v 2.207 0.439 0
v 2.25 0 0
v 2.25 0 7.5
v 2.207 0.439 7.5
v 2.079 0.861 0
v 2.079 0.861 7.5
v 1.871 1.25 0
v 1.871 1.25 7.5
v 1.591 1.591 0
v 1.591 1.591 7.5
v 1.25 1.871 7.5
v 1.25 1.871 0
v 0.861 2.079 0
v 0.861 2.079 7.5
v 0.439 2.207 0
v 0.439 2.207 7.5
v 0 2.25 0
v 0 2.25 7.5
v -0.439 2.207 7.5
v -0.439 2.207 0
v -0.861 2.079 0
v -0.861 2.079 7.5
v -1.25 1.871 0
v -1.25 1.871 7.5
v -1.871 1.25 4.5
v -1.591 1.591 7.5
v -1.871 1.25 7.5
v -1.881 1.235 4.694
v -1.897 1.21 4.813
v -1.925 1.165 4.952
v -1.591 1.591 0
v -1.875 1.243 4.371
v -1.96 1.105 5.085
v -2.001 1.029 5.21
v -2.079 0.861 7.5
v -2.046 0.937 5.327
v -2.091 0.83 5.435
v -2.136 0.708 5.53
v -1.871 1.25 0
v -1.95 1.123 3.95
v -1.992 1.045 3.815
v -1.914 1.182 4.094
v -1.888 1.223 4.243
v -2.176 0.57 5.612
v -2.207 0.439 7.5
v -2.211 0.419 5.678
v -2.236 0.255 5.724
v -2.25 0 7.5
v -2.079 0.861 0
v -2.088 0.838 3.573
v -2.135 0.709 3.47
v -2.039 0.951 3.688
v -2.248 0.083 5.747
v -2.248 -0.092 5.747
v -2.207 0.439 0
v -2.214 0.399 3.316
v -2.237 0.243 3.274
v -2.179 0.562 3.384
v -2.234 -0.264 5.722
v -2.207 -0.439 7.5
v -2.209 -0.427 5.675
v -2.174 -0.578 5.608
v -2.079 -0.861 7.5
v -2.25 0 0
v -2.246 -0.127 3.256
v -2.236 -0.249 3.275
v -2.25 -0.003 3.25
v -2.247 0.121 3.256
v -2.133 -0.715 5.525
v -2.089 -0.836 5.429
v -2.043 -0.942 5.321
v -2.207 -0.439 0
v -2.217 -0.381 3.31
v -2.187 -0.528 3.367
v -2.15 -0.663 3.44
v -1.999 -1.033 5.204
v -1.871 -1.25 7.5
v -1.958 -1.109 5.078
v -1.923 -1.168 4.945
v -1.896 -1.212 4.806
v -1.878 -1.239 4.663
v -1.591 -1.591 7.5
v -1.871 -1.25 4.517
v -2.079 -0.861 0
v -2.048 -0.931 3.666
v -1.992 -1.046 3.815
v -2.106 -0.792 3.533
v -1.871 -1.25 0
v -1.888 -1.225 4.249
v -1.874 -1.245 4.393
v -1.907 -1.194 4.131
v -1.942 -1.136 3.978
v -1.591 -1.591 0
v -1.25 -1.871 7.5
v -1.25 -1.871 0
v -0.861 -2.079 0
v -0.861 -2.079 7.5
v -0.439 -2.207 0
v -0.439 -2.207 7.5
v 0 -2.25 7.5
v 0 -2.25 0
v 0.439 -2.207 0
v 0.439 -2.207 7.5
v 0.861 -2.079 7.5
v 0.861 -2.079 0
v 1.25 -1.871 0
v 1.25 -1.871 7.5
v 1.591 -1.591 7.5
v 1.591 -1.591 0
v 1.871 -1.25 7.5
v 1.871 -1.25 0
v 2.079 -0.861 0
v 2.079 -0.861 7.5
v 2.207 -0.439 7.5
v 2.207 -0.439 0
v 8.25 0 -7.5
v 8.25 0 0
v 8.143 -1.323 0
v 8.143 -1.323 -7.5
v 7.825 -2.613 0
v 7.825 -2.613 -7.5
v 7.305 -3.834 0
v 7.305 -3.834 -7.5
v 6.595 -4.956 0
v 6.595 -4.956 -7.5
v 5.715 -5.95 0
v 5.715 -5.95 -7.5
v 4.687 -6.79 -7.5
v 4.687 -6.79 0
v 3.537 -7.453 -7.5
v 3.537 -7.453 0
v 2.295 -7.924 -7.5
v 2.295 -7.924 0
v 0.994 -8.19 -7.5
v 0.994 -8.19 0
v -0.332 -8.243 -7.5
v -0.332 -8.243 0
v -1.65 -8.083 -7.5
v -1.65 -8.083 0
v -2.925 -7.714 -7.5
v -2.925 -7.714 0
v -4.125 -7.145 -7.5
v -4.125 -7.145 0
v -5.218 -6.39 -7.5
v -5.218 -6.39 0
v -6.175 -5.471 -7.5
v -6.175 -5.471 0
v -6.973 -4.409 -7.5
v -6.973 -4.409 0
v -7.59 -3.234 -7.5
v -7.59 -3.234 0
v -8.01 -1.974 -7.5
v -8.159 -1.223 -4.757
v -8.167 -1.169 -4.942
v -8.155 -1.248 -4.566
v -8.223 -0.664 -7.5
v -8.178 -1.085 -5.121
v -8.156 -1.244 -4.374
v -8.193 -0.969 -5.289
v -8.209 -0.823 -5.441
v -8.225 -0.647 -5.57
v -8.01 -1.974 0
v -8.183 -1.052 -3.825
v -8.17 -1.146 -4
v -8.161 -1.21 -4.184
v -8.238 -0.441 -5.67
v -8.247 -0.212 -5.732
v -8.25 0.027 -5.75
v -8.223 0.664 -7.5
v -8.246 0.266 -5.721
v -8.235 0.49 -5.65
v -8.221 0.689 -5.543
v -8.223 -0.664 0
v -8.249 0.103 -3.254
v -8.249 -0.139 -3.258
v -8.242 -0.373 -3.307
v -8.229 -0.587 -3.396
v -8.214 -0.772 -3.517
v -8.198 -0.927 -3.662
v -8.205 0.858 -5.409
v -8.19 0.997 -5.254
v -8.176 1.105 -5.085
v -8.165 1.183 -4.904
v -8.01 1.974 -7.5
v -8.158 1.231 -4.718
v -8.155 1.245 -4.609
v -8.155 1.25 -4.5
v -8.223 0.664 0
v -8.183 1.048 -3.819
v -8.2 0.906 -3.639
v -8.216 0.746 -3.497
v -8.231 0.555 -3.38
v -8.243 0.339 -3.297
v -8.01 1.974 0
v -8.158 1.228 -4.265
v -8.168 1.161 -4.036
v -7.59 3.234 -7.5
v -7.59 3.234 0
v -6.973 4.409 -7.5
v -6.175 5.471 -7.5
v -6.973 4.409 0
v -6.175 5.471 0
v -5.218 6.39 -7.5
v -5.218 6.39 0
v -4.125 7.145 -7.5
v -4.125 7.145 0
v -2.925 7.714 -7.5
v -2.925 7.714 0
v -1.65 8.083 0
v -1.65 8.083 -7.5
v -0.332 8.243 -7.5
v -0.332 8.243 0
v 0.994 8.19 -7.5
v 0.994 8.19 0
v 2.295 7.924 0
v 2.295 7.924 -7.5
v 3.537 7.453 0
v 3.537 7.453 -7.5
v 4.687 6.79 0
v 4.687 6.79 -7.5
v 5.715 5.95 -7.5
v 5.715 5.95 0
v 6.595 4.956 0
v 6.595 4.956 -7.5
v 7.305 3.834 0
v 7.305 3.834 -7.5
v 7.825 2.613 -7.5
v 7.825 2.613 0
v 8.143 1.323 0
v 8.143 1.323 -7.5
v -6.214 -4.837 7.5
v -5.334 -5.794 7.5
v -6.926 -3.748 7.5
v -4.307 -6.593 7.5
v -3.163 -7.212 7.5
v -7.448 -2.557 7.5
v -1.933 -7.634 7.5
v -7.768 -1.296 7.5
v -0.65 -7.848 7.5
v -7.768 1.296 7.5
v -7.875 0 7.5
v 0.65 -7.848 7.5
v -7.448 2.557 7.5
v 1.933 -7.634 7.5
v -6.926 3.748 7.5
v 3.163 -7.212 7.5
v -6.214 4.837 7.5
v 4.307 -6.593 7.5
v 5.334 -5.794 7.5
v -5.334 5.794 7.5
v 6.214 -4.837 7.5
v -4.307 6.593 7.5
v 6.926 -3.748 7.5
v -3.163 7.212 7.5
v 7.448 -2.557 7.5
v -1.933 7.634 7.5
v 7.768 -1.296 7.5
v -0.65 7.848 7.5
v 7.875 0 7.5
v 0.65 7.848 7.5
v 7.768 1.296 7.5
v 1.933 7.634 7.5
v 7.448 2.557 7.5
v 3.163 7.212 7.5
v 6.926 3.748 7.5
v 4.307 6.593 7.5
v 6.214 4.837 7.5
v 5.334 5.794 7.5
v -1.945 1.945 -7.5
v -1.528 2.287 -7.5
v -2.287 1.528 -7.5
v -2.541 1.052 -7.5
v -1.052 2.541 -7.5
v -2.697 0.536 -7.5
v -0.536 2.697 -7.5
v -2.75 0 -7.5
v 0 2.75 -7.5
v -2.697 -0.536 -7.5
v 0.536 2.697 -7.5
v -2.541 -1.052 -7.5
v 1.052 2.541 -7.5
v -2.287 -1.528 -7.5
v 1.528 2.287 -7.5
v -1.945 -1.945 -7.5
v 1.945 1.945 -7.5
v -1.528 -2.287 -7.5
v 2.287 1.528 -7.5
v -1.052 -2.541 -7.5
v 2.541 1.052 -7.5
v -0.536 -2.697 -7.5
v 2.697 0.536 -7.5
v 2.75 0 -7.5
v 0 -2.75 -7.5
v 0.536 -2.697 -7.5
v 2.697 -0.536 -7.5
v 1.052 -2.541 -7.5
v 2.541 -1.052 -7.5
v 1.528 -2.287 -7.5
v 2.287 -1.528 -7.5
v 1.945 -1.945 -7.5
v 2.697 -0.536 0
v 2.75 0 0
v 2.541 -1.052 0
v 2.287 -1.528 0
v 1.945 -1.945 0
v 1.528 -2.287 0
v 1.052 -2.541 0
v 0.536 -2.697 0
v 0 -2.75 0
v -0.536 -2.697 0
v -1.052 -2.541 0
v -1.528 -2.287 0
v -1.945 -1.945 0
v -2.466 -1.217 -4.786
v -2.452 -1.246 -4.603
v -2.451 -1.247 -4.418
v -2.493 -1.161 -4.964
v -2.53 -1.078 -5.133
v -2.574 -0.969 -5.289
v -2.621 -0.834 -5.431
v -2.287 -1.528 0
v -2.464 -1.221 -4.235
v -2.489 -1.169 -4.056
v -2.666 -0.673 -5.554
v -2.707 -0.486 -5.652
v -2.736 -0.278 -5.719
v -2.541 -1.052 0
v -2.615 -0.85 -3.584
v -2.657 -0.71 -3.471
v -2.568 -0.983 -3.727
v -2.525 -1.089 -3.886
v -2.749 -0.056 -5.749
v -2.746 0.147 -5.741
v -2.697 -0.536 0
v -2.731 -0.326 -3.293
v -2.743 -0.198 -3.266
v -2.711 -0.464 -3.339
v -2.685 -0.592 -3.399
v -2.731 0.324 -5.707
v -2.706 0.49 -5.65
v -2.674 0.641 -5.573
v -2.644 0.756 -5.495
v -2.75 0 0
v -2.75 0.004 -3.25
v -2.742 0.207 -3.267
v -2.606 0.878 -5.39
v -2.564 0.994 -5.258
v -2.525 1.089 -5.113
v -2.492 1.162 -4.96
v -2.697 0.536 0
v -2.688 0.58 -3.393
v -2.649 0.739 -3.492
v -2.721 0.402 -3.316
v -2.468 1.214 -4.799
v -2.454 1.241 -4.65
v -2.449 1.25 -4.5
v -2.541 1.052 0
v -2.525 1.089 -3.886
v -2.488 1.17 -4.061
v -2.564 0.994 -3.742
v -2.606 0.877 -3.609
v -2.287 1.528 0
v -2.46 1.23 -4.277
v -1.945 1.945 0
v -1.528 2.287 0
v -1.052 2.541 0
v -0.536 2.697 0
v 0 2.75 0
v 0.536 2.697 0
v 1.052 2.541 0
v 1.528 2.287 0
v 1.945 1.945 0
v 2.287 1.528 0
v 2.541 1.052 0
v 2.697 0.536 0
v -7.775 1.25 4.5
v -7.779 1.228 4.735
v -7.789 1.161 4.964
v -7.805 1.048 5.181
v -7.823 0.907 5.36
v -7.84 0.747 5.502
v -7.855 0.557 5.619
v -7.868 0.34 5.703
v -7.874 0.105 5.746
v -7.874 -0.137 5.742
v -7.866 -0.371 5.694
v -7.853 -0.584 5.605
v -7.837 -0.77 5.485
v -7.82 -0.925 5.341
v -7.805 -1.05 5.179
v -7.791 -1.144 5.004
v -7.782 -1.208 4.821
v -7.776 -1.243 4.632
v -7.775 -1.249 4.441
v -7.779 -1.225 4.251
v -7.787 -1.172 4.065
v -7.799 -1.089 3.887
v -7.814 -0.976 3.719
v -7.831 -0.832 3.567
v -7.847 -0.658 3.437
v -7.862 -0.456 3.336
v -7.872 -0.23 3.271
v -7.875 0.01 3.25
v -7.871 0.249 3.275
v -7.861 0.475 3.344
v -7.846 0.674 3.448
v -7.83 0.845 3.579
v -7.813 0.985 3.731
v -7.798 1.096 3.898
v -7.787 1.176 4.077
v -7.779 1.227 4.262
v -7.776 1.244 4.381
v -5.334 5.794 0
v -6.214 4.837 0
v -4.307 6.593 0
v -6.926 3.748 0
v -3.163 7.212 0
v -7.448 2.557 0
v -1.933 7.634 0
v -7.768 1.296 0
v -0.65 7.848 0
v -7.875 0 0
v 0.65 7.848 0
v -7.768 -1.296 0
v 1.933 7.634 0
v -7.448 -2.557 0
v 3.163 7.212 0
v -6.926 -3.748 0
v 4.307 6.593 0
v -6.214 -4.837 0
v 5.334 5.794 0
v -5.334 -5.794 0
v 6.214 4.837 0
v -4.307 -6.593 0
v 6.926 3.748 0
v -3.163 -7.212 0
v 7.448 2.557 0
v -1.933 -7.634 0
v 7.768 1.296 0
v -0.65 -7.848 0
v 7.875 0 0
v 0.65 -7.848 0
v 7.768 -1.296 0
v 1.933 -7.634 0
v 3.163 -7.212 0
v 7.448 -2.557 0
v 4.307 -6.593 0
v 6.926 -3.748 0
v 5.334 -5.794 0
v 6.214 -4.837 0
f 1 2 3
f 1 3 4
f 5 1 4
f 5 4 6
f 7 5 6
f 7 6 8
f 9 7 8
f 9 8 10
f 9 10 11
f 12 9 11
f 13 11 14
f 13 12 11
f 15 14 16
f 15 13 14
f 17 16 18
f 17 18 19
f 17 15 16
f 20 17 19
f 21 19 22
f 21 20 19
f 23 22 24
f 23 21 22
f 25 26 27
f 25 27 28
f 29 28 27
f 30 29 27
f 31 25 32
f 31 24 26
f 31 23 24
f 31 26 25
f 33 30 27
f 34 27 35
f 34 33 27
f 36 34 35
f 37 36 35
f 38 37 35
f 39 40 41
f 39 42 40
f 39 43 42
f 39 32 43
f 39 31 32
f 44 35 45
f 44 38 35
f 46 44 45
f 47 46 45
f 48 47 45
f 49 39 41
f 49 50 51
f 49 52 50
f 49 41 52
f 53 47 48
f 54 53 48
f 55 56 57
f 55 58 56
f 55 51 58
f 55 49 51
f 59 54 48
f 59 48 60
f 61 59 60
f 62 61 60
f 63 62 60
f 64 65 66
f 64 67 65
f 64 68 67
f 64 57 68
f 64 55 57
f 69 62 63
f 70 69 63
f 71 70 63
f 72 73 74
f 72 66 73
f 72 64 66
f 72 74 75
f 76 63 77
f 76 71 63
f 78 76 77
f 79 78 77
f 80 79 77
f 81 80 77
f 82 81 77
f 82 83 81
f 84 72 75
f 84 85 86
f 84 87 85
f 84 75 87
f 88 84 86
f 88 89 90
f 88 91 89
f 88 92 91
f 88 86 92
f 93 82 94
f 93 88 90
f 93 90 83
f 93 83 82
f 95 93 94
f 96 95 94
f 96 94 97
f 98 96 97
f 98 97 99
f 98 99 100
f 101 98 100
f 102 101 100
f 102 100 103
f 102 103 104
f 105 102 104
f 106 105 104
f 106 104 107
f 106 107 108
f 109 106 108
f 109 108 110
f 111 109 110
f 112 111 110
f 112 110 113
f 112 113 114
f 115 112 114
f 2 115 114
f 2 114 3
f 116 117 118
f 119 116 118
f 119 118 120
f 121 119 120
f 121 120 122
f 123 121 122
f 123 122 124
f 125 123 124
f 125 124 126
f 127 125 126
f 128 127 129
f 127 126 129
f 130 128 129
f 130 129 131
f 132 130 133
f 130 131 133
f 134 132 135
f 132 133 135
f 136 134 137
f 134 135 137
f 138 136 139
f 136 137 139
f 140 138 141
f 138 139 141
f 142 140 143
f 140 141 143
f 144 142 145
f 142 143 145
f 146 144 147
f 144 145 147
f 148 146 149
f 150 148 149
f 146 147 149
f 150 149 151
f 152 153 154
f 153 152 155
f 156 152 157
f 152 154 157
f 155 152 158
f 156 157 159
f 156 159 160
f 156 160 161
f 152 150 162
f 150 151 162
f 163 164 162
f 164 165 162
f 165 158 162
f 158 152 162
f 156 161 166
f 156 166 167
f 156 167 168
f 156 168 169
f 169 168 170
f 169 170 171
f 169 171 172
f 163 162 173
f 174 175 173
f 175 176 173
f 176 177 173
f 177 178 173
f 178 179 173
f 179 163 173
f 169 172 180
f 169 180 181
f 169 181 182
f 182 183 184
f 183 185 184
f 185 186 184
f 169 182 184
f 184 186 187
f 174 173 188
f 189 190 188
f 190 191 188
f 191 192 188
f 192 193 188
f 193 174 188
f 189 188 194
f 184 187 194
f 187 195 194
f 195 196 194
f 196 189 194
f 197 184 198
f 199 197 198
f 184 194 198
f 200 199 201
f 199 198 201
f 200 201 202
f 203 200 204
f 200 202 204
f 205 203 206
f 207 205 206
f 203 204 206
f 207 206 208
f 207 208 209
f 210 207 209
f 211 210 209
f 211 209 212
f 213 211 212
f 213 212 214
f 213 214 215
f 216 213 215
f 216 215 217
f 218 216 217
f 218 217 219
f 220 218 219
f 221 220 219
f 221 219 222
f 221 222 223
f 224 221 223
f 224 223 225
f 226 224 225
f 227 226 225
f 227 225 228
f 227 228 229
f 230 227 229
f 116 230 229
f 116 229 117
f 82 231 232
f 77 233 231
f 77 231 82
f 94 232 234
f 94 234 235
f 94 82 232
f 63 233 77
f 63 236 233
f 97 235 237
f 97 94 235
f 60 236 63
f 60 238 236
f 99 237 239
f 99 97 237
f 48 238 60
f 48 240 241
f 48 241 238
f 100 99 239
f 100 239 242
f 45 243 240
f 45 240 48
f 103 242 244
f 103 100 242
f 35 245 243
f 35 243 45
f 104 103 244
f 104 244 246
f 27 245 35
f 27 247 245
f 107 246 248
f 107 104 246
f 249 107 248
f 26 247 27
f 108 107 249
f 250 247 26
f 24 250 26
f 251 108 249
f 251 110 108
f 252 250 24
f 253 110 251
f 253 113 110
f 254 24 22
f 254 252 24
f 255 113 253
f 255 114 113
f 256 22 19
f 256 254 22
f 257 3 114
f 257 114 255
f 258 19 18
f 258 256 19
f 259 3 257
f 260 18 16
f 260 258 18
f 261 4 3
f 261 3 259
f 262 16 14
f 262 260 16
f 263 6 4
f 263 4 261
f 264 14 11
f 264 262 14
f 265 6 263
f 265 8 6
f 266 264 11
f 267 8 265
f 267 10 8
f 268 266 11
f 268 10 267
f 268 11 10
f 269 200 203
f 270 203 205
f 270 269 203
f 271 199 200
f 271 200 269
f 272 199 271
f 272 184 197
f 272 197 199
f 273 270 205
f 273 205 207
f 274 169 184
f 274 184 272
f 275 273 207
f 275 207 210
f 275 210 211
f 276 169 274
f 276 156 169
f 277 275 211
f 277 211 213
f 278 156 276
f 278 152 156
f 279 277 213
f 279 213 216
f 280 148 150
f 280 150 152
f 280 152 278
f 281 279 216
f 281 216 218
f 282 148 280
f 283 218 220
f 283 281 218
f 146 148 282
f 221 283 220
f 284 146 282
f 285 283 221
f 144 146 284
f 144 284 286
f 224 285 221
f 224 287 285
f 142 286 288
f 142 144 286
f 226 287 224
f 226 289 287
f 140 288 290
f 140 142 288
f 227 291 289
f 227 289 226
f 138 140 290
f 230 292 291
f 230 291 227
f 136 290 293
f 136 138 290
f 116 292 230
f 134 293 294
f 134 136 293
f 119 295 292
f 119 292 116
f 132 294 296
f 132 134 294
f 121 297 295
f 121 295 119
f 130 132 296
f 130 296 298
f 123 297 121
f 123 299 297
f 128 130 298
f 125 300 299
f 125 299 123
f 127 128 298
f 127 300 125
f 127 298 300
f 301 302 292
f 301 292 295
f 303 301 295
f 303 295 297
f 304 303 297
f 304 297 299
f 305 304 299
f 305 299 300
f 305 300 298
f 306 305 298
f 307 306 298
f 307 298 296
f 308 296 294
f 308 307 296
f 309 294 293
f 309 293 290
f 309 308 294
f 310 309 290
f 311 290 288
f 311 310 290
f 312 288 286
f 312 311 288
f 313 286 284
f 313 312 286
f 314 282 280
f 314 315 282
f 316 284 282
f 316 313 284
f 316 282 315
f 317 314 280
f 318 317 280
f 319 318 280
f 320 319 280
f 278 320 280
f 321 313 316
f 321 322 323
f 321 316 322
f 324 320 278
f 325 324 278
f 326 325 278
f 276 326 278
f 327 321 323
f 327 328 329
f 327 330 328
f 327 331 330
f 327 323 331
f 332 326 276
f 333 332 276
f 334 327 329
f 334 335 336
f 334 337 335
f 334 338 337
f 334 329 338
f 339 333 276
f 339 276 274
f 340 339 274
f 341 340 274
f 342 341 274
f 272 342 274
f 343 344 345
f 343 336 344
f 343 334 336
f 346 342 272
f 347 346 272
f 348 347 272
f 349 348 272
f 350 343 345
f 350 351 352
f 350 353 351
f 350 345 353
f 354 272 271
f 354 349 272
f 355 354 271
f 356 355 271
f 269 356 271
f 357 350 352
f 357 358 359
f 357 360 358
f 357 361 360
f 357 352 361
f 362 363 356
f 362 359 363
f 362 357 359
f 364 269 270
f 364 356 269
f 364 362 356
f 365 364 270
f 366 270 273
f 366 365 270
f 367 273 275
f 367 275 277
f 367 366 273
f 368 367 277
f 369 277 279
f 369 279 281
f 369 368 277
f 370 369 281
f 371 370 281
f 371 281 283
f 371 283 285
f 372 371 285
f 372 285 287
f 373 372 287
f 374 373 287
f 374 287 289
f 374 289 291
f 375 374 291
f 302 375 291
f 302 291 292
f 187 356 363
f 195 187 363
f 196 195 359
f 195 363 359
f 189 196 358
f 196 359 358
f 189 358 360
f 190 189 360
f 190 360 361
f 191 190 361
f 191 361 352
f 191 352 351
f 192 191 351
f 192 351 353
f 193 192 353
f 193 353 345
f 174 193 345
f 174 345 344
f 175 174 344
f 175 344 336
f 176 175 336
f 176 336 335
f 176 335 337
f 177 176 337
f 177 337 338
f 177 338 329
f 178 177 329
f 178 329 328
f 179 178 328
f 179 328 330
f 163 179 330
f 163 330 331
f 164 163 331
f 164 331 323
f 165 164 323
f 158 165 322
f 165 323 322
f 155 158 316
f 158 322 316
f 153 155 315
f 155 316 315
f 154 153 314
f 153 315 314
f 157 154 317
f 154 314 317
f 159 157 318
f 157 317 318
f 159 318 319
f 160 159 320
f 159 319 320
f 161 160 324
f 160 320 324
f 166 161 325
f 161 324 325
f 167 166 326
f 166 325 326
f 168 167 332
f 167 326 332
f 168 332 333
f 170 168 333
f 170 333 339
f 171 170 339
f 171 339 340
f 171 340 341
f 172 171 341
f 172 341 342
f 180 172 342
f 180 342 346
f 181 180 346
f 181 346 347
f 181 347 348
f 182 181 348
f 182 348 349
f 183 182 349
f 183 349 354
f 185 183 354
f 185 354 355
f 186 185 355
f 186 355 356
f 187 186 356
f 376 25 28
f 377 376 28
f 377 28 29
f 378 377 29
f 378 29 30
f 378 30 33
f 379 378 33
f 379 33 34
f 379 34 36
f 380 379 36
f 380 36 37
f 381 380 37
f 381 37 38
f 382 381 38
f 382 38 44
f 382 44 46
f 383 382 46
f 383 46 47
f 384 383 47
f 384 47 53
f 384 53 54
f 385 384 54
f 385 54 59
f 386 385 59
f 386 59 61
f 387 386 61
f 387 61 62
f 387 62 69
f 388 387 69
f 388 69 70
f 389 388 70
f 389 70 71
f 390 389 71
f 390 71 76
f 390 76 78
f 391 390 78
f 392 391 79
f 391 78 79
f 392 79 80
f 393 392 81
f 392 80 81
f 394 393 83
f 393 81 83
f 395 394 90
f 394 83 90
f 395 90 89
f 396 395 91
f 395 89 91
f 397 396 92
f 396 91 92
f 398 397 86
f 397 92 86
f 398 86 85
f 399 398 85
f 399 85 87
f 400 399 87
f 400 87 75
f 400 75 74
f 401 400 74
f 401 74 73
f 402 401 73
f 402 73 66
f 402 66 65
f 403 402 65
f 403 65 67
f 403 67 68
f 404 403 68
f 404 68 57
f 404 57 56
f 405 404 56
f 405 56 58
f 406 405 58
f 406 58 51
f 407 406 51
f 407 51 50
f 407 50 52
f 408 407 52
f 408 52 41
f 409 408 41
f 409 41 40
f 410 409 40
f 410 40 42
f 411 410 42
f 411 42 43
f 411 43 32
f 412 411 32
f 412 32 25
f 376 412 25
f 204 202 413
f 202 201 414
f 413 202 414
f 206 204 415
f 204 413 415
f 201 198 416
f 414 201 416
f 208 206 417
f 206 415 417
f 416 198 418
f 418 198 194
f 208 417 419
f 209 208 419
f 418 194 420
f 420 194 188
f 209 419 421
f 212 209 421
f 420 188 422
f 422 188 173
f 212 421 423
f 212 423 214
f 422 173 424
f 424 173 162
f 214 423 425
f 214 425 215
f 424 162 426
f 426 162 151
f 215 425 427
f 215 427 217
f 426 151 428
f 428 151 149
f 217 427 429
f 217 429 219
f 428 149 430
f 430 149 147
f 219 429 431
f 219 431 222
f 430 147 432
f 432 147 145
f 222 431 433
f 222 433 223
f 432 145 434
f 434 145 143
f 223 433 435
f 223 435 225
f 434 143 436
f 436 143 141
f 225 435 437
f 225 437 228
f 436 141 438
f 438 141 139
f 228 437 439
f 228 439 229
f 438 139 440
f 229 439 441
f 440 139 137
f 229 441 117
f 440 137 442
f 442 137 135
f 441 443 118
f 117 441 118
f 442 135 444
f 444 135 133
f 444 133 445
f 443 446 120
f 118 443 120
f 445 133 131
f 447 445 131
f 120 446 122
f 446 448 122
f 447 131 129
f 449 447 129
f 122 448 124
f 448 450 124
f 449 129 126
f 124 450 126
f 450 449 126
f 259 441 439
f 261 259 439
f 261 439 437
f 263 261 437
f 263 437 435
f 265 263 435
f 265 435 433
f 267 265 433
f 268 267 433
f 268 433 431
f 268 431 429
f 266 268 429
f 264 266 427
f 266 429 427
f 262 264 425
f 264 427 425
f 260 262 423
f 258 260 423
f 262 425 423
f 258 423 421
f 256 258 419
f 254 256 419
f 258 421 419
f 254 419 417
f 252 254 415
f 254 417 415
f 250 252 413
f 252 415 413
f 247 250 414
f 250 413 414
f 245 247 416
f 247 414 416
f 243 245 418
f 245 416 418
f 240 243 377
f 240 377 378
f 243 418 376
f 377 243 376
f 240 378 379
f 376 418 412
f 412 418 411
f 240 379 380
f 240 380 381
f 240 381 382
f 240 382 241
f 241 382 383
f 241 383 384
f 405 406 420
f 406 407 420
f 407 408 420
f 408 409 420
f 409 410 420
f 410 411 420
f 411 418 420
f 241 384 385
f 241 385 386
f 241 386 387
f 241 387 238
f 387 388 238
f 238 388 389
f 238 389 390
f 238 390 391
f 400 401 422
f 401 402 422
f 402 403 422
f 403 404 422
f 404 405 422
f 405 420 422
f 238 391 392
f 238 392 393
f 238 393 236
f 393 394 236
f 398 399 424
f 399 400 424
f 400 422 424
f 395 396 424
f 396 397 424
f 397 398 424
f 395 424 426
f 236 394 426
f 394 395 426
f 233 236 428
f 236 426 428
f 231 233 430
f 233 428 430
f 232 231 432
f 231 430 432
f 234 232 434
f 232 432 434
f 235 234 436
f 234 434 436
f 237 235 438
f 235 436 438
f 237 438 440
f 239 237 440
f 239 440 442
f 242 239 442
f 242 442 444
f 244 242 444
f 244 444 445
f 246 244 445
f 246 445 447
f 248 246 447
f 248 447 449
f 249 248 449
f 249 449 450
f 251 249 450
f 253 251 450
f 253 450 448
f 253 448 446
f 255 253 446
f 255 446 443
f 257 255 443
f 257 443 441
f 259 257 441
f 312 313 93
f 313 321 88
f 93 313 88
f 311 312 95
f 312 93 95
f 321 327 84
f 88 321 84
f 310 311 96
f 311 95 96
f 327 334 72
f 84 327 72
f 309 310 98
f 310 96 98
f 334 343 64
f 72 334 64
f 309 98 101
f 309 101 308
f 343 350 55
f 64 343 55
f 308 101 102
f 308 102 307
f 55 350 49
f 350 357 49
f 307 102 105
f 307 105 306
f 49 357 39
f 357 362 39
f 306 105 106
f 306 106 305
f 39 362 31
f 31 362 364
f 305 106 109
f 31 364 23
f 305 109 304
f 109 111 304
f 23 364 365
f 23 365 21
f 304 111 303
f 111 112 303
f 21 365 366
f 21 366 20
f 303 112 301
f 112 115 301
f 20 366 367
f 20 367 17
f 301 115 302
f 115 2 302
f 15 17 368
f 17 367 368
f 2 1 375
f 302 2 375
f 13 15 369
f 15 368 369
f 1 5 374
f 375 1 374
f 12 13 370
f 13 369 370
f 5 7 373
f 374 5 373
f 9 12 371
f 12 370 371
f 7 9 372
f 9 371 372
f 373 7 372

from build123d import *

# Parameters (mm, degrees)
F0_R     = 7.875
F0_R_2   = 2.25
F1_DEPTH = 7.5
F2_R     = 8.25
F2_R_2   = 2.75
F3_DEPTH = 7.5
F4_R     = 1.25
F5_DEPTH = 25


with BuildPart() as f1:
    # F0 (on Top) → F1 (new body)
    with BuildSketch(Plane.XY):
        Circle(F0_R)
        Circle(F0_R_2, mode=Mode.SUBTRACT)
    extrude(amount=F1_DEPTH)

    # F2 (on face) → F3 (join)
    with BuildSketch(Plane(origin=(0, 0, 0), x_dir=(1, 0, 0), z_dir=(0, 0, -1))):
        Circle(F2_R)
        Circle(F2_R_2, mode=Mode.SUBTRACT)
    extrude(amount=F3_DEPTH)

    # F4 (on Right) → F5 (cut)
    with BuildSketch(Plane.YZ):
        with Locations((0, 4.5)):
            Circle(F4_R)
        with Locations((0, -4.5)):
            Circle(F4_R)
    extrude(amount=-F5_DEPTH, mode=Mode.SUBTRACT)


solid = f1.part
